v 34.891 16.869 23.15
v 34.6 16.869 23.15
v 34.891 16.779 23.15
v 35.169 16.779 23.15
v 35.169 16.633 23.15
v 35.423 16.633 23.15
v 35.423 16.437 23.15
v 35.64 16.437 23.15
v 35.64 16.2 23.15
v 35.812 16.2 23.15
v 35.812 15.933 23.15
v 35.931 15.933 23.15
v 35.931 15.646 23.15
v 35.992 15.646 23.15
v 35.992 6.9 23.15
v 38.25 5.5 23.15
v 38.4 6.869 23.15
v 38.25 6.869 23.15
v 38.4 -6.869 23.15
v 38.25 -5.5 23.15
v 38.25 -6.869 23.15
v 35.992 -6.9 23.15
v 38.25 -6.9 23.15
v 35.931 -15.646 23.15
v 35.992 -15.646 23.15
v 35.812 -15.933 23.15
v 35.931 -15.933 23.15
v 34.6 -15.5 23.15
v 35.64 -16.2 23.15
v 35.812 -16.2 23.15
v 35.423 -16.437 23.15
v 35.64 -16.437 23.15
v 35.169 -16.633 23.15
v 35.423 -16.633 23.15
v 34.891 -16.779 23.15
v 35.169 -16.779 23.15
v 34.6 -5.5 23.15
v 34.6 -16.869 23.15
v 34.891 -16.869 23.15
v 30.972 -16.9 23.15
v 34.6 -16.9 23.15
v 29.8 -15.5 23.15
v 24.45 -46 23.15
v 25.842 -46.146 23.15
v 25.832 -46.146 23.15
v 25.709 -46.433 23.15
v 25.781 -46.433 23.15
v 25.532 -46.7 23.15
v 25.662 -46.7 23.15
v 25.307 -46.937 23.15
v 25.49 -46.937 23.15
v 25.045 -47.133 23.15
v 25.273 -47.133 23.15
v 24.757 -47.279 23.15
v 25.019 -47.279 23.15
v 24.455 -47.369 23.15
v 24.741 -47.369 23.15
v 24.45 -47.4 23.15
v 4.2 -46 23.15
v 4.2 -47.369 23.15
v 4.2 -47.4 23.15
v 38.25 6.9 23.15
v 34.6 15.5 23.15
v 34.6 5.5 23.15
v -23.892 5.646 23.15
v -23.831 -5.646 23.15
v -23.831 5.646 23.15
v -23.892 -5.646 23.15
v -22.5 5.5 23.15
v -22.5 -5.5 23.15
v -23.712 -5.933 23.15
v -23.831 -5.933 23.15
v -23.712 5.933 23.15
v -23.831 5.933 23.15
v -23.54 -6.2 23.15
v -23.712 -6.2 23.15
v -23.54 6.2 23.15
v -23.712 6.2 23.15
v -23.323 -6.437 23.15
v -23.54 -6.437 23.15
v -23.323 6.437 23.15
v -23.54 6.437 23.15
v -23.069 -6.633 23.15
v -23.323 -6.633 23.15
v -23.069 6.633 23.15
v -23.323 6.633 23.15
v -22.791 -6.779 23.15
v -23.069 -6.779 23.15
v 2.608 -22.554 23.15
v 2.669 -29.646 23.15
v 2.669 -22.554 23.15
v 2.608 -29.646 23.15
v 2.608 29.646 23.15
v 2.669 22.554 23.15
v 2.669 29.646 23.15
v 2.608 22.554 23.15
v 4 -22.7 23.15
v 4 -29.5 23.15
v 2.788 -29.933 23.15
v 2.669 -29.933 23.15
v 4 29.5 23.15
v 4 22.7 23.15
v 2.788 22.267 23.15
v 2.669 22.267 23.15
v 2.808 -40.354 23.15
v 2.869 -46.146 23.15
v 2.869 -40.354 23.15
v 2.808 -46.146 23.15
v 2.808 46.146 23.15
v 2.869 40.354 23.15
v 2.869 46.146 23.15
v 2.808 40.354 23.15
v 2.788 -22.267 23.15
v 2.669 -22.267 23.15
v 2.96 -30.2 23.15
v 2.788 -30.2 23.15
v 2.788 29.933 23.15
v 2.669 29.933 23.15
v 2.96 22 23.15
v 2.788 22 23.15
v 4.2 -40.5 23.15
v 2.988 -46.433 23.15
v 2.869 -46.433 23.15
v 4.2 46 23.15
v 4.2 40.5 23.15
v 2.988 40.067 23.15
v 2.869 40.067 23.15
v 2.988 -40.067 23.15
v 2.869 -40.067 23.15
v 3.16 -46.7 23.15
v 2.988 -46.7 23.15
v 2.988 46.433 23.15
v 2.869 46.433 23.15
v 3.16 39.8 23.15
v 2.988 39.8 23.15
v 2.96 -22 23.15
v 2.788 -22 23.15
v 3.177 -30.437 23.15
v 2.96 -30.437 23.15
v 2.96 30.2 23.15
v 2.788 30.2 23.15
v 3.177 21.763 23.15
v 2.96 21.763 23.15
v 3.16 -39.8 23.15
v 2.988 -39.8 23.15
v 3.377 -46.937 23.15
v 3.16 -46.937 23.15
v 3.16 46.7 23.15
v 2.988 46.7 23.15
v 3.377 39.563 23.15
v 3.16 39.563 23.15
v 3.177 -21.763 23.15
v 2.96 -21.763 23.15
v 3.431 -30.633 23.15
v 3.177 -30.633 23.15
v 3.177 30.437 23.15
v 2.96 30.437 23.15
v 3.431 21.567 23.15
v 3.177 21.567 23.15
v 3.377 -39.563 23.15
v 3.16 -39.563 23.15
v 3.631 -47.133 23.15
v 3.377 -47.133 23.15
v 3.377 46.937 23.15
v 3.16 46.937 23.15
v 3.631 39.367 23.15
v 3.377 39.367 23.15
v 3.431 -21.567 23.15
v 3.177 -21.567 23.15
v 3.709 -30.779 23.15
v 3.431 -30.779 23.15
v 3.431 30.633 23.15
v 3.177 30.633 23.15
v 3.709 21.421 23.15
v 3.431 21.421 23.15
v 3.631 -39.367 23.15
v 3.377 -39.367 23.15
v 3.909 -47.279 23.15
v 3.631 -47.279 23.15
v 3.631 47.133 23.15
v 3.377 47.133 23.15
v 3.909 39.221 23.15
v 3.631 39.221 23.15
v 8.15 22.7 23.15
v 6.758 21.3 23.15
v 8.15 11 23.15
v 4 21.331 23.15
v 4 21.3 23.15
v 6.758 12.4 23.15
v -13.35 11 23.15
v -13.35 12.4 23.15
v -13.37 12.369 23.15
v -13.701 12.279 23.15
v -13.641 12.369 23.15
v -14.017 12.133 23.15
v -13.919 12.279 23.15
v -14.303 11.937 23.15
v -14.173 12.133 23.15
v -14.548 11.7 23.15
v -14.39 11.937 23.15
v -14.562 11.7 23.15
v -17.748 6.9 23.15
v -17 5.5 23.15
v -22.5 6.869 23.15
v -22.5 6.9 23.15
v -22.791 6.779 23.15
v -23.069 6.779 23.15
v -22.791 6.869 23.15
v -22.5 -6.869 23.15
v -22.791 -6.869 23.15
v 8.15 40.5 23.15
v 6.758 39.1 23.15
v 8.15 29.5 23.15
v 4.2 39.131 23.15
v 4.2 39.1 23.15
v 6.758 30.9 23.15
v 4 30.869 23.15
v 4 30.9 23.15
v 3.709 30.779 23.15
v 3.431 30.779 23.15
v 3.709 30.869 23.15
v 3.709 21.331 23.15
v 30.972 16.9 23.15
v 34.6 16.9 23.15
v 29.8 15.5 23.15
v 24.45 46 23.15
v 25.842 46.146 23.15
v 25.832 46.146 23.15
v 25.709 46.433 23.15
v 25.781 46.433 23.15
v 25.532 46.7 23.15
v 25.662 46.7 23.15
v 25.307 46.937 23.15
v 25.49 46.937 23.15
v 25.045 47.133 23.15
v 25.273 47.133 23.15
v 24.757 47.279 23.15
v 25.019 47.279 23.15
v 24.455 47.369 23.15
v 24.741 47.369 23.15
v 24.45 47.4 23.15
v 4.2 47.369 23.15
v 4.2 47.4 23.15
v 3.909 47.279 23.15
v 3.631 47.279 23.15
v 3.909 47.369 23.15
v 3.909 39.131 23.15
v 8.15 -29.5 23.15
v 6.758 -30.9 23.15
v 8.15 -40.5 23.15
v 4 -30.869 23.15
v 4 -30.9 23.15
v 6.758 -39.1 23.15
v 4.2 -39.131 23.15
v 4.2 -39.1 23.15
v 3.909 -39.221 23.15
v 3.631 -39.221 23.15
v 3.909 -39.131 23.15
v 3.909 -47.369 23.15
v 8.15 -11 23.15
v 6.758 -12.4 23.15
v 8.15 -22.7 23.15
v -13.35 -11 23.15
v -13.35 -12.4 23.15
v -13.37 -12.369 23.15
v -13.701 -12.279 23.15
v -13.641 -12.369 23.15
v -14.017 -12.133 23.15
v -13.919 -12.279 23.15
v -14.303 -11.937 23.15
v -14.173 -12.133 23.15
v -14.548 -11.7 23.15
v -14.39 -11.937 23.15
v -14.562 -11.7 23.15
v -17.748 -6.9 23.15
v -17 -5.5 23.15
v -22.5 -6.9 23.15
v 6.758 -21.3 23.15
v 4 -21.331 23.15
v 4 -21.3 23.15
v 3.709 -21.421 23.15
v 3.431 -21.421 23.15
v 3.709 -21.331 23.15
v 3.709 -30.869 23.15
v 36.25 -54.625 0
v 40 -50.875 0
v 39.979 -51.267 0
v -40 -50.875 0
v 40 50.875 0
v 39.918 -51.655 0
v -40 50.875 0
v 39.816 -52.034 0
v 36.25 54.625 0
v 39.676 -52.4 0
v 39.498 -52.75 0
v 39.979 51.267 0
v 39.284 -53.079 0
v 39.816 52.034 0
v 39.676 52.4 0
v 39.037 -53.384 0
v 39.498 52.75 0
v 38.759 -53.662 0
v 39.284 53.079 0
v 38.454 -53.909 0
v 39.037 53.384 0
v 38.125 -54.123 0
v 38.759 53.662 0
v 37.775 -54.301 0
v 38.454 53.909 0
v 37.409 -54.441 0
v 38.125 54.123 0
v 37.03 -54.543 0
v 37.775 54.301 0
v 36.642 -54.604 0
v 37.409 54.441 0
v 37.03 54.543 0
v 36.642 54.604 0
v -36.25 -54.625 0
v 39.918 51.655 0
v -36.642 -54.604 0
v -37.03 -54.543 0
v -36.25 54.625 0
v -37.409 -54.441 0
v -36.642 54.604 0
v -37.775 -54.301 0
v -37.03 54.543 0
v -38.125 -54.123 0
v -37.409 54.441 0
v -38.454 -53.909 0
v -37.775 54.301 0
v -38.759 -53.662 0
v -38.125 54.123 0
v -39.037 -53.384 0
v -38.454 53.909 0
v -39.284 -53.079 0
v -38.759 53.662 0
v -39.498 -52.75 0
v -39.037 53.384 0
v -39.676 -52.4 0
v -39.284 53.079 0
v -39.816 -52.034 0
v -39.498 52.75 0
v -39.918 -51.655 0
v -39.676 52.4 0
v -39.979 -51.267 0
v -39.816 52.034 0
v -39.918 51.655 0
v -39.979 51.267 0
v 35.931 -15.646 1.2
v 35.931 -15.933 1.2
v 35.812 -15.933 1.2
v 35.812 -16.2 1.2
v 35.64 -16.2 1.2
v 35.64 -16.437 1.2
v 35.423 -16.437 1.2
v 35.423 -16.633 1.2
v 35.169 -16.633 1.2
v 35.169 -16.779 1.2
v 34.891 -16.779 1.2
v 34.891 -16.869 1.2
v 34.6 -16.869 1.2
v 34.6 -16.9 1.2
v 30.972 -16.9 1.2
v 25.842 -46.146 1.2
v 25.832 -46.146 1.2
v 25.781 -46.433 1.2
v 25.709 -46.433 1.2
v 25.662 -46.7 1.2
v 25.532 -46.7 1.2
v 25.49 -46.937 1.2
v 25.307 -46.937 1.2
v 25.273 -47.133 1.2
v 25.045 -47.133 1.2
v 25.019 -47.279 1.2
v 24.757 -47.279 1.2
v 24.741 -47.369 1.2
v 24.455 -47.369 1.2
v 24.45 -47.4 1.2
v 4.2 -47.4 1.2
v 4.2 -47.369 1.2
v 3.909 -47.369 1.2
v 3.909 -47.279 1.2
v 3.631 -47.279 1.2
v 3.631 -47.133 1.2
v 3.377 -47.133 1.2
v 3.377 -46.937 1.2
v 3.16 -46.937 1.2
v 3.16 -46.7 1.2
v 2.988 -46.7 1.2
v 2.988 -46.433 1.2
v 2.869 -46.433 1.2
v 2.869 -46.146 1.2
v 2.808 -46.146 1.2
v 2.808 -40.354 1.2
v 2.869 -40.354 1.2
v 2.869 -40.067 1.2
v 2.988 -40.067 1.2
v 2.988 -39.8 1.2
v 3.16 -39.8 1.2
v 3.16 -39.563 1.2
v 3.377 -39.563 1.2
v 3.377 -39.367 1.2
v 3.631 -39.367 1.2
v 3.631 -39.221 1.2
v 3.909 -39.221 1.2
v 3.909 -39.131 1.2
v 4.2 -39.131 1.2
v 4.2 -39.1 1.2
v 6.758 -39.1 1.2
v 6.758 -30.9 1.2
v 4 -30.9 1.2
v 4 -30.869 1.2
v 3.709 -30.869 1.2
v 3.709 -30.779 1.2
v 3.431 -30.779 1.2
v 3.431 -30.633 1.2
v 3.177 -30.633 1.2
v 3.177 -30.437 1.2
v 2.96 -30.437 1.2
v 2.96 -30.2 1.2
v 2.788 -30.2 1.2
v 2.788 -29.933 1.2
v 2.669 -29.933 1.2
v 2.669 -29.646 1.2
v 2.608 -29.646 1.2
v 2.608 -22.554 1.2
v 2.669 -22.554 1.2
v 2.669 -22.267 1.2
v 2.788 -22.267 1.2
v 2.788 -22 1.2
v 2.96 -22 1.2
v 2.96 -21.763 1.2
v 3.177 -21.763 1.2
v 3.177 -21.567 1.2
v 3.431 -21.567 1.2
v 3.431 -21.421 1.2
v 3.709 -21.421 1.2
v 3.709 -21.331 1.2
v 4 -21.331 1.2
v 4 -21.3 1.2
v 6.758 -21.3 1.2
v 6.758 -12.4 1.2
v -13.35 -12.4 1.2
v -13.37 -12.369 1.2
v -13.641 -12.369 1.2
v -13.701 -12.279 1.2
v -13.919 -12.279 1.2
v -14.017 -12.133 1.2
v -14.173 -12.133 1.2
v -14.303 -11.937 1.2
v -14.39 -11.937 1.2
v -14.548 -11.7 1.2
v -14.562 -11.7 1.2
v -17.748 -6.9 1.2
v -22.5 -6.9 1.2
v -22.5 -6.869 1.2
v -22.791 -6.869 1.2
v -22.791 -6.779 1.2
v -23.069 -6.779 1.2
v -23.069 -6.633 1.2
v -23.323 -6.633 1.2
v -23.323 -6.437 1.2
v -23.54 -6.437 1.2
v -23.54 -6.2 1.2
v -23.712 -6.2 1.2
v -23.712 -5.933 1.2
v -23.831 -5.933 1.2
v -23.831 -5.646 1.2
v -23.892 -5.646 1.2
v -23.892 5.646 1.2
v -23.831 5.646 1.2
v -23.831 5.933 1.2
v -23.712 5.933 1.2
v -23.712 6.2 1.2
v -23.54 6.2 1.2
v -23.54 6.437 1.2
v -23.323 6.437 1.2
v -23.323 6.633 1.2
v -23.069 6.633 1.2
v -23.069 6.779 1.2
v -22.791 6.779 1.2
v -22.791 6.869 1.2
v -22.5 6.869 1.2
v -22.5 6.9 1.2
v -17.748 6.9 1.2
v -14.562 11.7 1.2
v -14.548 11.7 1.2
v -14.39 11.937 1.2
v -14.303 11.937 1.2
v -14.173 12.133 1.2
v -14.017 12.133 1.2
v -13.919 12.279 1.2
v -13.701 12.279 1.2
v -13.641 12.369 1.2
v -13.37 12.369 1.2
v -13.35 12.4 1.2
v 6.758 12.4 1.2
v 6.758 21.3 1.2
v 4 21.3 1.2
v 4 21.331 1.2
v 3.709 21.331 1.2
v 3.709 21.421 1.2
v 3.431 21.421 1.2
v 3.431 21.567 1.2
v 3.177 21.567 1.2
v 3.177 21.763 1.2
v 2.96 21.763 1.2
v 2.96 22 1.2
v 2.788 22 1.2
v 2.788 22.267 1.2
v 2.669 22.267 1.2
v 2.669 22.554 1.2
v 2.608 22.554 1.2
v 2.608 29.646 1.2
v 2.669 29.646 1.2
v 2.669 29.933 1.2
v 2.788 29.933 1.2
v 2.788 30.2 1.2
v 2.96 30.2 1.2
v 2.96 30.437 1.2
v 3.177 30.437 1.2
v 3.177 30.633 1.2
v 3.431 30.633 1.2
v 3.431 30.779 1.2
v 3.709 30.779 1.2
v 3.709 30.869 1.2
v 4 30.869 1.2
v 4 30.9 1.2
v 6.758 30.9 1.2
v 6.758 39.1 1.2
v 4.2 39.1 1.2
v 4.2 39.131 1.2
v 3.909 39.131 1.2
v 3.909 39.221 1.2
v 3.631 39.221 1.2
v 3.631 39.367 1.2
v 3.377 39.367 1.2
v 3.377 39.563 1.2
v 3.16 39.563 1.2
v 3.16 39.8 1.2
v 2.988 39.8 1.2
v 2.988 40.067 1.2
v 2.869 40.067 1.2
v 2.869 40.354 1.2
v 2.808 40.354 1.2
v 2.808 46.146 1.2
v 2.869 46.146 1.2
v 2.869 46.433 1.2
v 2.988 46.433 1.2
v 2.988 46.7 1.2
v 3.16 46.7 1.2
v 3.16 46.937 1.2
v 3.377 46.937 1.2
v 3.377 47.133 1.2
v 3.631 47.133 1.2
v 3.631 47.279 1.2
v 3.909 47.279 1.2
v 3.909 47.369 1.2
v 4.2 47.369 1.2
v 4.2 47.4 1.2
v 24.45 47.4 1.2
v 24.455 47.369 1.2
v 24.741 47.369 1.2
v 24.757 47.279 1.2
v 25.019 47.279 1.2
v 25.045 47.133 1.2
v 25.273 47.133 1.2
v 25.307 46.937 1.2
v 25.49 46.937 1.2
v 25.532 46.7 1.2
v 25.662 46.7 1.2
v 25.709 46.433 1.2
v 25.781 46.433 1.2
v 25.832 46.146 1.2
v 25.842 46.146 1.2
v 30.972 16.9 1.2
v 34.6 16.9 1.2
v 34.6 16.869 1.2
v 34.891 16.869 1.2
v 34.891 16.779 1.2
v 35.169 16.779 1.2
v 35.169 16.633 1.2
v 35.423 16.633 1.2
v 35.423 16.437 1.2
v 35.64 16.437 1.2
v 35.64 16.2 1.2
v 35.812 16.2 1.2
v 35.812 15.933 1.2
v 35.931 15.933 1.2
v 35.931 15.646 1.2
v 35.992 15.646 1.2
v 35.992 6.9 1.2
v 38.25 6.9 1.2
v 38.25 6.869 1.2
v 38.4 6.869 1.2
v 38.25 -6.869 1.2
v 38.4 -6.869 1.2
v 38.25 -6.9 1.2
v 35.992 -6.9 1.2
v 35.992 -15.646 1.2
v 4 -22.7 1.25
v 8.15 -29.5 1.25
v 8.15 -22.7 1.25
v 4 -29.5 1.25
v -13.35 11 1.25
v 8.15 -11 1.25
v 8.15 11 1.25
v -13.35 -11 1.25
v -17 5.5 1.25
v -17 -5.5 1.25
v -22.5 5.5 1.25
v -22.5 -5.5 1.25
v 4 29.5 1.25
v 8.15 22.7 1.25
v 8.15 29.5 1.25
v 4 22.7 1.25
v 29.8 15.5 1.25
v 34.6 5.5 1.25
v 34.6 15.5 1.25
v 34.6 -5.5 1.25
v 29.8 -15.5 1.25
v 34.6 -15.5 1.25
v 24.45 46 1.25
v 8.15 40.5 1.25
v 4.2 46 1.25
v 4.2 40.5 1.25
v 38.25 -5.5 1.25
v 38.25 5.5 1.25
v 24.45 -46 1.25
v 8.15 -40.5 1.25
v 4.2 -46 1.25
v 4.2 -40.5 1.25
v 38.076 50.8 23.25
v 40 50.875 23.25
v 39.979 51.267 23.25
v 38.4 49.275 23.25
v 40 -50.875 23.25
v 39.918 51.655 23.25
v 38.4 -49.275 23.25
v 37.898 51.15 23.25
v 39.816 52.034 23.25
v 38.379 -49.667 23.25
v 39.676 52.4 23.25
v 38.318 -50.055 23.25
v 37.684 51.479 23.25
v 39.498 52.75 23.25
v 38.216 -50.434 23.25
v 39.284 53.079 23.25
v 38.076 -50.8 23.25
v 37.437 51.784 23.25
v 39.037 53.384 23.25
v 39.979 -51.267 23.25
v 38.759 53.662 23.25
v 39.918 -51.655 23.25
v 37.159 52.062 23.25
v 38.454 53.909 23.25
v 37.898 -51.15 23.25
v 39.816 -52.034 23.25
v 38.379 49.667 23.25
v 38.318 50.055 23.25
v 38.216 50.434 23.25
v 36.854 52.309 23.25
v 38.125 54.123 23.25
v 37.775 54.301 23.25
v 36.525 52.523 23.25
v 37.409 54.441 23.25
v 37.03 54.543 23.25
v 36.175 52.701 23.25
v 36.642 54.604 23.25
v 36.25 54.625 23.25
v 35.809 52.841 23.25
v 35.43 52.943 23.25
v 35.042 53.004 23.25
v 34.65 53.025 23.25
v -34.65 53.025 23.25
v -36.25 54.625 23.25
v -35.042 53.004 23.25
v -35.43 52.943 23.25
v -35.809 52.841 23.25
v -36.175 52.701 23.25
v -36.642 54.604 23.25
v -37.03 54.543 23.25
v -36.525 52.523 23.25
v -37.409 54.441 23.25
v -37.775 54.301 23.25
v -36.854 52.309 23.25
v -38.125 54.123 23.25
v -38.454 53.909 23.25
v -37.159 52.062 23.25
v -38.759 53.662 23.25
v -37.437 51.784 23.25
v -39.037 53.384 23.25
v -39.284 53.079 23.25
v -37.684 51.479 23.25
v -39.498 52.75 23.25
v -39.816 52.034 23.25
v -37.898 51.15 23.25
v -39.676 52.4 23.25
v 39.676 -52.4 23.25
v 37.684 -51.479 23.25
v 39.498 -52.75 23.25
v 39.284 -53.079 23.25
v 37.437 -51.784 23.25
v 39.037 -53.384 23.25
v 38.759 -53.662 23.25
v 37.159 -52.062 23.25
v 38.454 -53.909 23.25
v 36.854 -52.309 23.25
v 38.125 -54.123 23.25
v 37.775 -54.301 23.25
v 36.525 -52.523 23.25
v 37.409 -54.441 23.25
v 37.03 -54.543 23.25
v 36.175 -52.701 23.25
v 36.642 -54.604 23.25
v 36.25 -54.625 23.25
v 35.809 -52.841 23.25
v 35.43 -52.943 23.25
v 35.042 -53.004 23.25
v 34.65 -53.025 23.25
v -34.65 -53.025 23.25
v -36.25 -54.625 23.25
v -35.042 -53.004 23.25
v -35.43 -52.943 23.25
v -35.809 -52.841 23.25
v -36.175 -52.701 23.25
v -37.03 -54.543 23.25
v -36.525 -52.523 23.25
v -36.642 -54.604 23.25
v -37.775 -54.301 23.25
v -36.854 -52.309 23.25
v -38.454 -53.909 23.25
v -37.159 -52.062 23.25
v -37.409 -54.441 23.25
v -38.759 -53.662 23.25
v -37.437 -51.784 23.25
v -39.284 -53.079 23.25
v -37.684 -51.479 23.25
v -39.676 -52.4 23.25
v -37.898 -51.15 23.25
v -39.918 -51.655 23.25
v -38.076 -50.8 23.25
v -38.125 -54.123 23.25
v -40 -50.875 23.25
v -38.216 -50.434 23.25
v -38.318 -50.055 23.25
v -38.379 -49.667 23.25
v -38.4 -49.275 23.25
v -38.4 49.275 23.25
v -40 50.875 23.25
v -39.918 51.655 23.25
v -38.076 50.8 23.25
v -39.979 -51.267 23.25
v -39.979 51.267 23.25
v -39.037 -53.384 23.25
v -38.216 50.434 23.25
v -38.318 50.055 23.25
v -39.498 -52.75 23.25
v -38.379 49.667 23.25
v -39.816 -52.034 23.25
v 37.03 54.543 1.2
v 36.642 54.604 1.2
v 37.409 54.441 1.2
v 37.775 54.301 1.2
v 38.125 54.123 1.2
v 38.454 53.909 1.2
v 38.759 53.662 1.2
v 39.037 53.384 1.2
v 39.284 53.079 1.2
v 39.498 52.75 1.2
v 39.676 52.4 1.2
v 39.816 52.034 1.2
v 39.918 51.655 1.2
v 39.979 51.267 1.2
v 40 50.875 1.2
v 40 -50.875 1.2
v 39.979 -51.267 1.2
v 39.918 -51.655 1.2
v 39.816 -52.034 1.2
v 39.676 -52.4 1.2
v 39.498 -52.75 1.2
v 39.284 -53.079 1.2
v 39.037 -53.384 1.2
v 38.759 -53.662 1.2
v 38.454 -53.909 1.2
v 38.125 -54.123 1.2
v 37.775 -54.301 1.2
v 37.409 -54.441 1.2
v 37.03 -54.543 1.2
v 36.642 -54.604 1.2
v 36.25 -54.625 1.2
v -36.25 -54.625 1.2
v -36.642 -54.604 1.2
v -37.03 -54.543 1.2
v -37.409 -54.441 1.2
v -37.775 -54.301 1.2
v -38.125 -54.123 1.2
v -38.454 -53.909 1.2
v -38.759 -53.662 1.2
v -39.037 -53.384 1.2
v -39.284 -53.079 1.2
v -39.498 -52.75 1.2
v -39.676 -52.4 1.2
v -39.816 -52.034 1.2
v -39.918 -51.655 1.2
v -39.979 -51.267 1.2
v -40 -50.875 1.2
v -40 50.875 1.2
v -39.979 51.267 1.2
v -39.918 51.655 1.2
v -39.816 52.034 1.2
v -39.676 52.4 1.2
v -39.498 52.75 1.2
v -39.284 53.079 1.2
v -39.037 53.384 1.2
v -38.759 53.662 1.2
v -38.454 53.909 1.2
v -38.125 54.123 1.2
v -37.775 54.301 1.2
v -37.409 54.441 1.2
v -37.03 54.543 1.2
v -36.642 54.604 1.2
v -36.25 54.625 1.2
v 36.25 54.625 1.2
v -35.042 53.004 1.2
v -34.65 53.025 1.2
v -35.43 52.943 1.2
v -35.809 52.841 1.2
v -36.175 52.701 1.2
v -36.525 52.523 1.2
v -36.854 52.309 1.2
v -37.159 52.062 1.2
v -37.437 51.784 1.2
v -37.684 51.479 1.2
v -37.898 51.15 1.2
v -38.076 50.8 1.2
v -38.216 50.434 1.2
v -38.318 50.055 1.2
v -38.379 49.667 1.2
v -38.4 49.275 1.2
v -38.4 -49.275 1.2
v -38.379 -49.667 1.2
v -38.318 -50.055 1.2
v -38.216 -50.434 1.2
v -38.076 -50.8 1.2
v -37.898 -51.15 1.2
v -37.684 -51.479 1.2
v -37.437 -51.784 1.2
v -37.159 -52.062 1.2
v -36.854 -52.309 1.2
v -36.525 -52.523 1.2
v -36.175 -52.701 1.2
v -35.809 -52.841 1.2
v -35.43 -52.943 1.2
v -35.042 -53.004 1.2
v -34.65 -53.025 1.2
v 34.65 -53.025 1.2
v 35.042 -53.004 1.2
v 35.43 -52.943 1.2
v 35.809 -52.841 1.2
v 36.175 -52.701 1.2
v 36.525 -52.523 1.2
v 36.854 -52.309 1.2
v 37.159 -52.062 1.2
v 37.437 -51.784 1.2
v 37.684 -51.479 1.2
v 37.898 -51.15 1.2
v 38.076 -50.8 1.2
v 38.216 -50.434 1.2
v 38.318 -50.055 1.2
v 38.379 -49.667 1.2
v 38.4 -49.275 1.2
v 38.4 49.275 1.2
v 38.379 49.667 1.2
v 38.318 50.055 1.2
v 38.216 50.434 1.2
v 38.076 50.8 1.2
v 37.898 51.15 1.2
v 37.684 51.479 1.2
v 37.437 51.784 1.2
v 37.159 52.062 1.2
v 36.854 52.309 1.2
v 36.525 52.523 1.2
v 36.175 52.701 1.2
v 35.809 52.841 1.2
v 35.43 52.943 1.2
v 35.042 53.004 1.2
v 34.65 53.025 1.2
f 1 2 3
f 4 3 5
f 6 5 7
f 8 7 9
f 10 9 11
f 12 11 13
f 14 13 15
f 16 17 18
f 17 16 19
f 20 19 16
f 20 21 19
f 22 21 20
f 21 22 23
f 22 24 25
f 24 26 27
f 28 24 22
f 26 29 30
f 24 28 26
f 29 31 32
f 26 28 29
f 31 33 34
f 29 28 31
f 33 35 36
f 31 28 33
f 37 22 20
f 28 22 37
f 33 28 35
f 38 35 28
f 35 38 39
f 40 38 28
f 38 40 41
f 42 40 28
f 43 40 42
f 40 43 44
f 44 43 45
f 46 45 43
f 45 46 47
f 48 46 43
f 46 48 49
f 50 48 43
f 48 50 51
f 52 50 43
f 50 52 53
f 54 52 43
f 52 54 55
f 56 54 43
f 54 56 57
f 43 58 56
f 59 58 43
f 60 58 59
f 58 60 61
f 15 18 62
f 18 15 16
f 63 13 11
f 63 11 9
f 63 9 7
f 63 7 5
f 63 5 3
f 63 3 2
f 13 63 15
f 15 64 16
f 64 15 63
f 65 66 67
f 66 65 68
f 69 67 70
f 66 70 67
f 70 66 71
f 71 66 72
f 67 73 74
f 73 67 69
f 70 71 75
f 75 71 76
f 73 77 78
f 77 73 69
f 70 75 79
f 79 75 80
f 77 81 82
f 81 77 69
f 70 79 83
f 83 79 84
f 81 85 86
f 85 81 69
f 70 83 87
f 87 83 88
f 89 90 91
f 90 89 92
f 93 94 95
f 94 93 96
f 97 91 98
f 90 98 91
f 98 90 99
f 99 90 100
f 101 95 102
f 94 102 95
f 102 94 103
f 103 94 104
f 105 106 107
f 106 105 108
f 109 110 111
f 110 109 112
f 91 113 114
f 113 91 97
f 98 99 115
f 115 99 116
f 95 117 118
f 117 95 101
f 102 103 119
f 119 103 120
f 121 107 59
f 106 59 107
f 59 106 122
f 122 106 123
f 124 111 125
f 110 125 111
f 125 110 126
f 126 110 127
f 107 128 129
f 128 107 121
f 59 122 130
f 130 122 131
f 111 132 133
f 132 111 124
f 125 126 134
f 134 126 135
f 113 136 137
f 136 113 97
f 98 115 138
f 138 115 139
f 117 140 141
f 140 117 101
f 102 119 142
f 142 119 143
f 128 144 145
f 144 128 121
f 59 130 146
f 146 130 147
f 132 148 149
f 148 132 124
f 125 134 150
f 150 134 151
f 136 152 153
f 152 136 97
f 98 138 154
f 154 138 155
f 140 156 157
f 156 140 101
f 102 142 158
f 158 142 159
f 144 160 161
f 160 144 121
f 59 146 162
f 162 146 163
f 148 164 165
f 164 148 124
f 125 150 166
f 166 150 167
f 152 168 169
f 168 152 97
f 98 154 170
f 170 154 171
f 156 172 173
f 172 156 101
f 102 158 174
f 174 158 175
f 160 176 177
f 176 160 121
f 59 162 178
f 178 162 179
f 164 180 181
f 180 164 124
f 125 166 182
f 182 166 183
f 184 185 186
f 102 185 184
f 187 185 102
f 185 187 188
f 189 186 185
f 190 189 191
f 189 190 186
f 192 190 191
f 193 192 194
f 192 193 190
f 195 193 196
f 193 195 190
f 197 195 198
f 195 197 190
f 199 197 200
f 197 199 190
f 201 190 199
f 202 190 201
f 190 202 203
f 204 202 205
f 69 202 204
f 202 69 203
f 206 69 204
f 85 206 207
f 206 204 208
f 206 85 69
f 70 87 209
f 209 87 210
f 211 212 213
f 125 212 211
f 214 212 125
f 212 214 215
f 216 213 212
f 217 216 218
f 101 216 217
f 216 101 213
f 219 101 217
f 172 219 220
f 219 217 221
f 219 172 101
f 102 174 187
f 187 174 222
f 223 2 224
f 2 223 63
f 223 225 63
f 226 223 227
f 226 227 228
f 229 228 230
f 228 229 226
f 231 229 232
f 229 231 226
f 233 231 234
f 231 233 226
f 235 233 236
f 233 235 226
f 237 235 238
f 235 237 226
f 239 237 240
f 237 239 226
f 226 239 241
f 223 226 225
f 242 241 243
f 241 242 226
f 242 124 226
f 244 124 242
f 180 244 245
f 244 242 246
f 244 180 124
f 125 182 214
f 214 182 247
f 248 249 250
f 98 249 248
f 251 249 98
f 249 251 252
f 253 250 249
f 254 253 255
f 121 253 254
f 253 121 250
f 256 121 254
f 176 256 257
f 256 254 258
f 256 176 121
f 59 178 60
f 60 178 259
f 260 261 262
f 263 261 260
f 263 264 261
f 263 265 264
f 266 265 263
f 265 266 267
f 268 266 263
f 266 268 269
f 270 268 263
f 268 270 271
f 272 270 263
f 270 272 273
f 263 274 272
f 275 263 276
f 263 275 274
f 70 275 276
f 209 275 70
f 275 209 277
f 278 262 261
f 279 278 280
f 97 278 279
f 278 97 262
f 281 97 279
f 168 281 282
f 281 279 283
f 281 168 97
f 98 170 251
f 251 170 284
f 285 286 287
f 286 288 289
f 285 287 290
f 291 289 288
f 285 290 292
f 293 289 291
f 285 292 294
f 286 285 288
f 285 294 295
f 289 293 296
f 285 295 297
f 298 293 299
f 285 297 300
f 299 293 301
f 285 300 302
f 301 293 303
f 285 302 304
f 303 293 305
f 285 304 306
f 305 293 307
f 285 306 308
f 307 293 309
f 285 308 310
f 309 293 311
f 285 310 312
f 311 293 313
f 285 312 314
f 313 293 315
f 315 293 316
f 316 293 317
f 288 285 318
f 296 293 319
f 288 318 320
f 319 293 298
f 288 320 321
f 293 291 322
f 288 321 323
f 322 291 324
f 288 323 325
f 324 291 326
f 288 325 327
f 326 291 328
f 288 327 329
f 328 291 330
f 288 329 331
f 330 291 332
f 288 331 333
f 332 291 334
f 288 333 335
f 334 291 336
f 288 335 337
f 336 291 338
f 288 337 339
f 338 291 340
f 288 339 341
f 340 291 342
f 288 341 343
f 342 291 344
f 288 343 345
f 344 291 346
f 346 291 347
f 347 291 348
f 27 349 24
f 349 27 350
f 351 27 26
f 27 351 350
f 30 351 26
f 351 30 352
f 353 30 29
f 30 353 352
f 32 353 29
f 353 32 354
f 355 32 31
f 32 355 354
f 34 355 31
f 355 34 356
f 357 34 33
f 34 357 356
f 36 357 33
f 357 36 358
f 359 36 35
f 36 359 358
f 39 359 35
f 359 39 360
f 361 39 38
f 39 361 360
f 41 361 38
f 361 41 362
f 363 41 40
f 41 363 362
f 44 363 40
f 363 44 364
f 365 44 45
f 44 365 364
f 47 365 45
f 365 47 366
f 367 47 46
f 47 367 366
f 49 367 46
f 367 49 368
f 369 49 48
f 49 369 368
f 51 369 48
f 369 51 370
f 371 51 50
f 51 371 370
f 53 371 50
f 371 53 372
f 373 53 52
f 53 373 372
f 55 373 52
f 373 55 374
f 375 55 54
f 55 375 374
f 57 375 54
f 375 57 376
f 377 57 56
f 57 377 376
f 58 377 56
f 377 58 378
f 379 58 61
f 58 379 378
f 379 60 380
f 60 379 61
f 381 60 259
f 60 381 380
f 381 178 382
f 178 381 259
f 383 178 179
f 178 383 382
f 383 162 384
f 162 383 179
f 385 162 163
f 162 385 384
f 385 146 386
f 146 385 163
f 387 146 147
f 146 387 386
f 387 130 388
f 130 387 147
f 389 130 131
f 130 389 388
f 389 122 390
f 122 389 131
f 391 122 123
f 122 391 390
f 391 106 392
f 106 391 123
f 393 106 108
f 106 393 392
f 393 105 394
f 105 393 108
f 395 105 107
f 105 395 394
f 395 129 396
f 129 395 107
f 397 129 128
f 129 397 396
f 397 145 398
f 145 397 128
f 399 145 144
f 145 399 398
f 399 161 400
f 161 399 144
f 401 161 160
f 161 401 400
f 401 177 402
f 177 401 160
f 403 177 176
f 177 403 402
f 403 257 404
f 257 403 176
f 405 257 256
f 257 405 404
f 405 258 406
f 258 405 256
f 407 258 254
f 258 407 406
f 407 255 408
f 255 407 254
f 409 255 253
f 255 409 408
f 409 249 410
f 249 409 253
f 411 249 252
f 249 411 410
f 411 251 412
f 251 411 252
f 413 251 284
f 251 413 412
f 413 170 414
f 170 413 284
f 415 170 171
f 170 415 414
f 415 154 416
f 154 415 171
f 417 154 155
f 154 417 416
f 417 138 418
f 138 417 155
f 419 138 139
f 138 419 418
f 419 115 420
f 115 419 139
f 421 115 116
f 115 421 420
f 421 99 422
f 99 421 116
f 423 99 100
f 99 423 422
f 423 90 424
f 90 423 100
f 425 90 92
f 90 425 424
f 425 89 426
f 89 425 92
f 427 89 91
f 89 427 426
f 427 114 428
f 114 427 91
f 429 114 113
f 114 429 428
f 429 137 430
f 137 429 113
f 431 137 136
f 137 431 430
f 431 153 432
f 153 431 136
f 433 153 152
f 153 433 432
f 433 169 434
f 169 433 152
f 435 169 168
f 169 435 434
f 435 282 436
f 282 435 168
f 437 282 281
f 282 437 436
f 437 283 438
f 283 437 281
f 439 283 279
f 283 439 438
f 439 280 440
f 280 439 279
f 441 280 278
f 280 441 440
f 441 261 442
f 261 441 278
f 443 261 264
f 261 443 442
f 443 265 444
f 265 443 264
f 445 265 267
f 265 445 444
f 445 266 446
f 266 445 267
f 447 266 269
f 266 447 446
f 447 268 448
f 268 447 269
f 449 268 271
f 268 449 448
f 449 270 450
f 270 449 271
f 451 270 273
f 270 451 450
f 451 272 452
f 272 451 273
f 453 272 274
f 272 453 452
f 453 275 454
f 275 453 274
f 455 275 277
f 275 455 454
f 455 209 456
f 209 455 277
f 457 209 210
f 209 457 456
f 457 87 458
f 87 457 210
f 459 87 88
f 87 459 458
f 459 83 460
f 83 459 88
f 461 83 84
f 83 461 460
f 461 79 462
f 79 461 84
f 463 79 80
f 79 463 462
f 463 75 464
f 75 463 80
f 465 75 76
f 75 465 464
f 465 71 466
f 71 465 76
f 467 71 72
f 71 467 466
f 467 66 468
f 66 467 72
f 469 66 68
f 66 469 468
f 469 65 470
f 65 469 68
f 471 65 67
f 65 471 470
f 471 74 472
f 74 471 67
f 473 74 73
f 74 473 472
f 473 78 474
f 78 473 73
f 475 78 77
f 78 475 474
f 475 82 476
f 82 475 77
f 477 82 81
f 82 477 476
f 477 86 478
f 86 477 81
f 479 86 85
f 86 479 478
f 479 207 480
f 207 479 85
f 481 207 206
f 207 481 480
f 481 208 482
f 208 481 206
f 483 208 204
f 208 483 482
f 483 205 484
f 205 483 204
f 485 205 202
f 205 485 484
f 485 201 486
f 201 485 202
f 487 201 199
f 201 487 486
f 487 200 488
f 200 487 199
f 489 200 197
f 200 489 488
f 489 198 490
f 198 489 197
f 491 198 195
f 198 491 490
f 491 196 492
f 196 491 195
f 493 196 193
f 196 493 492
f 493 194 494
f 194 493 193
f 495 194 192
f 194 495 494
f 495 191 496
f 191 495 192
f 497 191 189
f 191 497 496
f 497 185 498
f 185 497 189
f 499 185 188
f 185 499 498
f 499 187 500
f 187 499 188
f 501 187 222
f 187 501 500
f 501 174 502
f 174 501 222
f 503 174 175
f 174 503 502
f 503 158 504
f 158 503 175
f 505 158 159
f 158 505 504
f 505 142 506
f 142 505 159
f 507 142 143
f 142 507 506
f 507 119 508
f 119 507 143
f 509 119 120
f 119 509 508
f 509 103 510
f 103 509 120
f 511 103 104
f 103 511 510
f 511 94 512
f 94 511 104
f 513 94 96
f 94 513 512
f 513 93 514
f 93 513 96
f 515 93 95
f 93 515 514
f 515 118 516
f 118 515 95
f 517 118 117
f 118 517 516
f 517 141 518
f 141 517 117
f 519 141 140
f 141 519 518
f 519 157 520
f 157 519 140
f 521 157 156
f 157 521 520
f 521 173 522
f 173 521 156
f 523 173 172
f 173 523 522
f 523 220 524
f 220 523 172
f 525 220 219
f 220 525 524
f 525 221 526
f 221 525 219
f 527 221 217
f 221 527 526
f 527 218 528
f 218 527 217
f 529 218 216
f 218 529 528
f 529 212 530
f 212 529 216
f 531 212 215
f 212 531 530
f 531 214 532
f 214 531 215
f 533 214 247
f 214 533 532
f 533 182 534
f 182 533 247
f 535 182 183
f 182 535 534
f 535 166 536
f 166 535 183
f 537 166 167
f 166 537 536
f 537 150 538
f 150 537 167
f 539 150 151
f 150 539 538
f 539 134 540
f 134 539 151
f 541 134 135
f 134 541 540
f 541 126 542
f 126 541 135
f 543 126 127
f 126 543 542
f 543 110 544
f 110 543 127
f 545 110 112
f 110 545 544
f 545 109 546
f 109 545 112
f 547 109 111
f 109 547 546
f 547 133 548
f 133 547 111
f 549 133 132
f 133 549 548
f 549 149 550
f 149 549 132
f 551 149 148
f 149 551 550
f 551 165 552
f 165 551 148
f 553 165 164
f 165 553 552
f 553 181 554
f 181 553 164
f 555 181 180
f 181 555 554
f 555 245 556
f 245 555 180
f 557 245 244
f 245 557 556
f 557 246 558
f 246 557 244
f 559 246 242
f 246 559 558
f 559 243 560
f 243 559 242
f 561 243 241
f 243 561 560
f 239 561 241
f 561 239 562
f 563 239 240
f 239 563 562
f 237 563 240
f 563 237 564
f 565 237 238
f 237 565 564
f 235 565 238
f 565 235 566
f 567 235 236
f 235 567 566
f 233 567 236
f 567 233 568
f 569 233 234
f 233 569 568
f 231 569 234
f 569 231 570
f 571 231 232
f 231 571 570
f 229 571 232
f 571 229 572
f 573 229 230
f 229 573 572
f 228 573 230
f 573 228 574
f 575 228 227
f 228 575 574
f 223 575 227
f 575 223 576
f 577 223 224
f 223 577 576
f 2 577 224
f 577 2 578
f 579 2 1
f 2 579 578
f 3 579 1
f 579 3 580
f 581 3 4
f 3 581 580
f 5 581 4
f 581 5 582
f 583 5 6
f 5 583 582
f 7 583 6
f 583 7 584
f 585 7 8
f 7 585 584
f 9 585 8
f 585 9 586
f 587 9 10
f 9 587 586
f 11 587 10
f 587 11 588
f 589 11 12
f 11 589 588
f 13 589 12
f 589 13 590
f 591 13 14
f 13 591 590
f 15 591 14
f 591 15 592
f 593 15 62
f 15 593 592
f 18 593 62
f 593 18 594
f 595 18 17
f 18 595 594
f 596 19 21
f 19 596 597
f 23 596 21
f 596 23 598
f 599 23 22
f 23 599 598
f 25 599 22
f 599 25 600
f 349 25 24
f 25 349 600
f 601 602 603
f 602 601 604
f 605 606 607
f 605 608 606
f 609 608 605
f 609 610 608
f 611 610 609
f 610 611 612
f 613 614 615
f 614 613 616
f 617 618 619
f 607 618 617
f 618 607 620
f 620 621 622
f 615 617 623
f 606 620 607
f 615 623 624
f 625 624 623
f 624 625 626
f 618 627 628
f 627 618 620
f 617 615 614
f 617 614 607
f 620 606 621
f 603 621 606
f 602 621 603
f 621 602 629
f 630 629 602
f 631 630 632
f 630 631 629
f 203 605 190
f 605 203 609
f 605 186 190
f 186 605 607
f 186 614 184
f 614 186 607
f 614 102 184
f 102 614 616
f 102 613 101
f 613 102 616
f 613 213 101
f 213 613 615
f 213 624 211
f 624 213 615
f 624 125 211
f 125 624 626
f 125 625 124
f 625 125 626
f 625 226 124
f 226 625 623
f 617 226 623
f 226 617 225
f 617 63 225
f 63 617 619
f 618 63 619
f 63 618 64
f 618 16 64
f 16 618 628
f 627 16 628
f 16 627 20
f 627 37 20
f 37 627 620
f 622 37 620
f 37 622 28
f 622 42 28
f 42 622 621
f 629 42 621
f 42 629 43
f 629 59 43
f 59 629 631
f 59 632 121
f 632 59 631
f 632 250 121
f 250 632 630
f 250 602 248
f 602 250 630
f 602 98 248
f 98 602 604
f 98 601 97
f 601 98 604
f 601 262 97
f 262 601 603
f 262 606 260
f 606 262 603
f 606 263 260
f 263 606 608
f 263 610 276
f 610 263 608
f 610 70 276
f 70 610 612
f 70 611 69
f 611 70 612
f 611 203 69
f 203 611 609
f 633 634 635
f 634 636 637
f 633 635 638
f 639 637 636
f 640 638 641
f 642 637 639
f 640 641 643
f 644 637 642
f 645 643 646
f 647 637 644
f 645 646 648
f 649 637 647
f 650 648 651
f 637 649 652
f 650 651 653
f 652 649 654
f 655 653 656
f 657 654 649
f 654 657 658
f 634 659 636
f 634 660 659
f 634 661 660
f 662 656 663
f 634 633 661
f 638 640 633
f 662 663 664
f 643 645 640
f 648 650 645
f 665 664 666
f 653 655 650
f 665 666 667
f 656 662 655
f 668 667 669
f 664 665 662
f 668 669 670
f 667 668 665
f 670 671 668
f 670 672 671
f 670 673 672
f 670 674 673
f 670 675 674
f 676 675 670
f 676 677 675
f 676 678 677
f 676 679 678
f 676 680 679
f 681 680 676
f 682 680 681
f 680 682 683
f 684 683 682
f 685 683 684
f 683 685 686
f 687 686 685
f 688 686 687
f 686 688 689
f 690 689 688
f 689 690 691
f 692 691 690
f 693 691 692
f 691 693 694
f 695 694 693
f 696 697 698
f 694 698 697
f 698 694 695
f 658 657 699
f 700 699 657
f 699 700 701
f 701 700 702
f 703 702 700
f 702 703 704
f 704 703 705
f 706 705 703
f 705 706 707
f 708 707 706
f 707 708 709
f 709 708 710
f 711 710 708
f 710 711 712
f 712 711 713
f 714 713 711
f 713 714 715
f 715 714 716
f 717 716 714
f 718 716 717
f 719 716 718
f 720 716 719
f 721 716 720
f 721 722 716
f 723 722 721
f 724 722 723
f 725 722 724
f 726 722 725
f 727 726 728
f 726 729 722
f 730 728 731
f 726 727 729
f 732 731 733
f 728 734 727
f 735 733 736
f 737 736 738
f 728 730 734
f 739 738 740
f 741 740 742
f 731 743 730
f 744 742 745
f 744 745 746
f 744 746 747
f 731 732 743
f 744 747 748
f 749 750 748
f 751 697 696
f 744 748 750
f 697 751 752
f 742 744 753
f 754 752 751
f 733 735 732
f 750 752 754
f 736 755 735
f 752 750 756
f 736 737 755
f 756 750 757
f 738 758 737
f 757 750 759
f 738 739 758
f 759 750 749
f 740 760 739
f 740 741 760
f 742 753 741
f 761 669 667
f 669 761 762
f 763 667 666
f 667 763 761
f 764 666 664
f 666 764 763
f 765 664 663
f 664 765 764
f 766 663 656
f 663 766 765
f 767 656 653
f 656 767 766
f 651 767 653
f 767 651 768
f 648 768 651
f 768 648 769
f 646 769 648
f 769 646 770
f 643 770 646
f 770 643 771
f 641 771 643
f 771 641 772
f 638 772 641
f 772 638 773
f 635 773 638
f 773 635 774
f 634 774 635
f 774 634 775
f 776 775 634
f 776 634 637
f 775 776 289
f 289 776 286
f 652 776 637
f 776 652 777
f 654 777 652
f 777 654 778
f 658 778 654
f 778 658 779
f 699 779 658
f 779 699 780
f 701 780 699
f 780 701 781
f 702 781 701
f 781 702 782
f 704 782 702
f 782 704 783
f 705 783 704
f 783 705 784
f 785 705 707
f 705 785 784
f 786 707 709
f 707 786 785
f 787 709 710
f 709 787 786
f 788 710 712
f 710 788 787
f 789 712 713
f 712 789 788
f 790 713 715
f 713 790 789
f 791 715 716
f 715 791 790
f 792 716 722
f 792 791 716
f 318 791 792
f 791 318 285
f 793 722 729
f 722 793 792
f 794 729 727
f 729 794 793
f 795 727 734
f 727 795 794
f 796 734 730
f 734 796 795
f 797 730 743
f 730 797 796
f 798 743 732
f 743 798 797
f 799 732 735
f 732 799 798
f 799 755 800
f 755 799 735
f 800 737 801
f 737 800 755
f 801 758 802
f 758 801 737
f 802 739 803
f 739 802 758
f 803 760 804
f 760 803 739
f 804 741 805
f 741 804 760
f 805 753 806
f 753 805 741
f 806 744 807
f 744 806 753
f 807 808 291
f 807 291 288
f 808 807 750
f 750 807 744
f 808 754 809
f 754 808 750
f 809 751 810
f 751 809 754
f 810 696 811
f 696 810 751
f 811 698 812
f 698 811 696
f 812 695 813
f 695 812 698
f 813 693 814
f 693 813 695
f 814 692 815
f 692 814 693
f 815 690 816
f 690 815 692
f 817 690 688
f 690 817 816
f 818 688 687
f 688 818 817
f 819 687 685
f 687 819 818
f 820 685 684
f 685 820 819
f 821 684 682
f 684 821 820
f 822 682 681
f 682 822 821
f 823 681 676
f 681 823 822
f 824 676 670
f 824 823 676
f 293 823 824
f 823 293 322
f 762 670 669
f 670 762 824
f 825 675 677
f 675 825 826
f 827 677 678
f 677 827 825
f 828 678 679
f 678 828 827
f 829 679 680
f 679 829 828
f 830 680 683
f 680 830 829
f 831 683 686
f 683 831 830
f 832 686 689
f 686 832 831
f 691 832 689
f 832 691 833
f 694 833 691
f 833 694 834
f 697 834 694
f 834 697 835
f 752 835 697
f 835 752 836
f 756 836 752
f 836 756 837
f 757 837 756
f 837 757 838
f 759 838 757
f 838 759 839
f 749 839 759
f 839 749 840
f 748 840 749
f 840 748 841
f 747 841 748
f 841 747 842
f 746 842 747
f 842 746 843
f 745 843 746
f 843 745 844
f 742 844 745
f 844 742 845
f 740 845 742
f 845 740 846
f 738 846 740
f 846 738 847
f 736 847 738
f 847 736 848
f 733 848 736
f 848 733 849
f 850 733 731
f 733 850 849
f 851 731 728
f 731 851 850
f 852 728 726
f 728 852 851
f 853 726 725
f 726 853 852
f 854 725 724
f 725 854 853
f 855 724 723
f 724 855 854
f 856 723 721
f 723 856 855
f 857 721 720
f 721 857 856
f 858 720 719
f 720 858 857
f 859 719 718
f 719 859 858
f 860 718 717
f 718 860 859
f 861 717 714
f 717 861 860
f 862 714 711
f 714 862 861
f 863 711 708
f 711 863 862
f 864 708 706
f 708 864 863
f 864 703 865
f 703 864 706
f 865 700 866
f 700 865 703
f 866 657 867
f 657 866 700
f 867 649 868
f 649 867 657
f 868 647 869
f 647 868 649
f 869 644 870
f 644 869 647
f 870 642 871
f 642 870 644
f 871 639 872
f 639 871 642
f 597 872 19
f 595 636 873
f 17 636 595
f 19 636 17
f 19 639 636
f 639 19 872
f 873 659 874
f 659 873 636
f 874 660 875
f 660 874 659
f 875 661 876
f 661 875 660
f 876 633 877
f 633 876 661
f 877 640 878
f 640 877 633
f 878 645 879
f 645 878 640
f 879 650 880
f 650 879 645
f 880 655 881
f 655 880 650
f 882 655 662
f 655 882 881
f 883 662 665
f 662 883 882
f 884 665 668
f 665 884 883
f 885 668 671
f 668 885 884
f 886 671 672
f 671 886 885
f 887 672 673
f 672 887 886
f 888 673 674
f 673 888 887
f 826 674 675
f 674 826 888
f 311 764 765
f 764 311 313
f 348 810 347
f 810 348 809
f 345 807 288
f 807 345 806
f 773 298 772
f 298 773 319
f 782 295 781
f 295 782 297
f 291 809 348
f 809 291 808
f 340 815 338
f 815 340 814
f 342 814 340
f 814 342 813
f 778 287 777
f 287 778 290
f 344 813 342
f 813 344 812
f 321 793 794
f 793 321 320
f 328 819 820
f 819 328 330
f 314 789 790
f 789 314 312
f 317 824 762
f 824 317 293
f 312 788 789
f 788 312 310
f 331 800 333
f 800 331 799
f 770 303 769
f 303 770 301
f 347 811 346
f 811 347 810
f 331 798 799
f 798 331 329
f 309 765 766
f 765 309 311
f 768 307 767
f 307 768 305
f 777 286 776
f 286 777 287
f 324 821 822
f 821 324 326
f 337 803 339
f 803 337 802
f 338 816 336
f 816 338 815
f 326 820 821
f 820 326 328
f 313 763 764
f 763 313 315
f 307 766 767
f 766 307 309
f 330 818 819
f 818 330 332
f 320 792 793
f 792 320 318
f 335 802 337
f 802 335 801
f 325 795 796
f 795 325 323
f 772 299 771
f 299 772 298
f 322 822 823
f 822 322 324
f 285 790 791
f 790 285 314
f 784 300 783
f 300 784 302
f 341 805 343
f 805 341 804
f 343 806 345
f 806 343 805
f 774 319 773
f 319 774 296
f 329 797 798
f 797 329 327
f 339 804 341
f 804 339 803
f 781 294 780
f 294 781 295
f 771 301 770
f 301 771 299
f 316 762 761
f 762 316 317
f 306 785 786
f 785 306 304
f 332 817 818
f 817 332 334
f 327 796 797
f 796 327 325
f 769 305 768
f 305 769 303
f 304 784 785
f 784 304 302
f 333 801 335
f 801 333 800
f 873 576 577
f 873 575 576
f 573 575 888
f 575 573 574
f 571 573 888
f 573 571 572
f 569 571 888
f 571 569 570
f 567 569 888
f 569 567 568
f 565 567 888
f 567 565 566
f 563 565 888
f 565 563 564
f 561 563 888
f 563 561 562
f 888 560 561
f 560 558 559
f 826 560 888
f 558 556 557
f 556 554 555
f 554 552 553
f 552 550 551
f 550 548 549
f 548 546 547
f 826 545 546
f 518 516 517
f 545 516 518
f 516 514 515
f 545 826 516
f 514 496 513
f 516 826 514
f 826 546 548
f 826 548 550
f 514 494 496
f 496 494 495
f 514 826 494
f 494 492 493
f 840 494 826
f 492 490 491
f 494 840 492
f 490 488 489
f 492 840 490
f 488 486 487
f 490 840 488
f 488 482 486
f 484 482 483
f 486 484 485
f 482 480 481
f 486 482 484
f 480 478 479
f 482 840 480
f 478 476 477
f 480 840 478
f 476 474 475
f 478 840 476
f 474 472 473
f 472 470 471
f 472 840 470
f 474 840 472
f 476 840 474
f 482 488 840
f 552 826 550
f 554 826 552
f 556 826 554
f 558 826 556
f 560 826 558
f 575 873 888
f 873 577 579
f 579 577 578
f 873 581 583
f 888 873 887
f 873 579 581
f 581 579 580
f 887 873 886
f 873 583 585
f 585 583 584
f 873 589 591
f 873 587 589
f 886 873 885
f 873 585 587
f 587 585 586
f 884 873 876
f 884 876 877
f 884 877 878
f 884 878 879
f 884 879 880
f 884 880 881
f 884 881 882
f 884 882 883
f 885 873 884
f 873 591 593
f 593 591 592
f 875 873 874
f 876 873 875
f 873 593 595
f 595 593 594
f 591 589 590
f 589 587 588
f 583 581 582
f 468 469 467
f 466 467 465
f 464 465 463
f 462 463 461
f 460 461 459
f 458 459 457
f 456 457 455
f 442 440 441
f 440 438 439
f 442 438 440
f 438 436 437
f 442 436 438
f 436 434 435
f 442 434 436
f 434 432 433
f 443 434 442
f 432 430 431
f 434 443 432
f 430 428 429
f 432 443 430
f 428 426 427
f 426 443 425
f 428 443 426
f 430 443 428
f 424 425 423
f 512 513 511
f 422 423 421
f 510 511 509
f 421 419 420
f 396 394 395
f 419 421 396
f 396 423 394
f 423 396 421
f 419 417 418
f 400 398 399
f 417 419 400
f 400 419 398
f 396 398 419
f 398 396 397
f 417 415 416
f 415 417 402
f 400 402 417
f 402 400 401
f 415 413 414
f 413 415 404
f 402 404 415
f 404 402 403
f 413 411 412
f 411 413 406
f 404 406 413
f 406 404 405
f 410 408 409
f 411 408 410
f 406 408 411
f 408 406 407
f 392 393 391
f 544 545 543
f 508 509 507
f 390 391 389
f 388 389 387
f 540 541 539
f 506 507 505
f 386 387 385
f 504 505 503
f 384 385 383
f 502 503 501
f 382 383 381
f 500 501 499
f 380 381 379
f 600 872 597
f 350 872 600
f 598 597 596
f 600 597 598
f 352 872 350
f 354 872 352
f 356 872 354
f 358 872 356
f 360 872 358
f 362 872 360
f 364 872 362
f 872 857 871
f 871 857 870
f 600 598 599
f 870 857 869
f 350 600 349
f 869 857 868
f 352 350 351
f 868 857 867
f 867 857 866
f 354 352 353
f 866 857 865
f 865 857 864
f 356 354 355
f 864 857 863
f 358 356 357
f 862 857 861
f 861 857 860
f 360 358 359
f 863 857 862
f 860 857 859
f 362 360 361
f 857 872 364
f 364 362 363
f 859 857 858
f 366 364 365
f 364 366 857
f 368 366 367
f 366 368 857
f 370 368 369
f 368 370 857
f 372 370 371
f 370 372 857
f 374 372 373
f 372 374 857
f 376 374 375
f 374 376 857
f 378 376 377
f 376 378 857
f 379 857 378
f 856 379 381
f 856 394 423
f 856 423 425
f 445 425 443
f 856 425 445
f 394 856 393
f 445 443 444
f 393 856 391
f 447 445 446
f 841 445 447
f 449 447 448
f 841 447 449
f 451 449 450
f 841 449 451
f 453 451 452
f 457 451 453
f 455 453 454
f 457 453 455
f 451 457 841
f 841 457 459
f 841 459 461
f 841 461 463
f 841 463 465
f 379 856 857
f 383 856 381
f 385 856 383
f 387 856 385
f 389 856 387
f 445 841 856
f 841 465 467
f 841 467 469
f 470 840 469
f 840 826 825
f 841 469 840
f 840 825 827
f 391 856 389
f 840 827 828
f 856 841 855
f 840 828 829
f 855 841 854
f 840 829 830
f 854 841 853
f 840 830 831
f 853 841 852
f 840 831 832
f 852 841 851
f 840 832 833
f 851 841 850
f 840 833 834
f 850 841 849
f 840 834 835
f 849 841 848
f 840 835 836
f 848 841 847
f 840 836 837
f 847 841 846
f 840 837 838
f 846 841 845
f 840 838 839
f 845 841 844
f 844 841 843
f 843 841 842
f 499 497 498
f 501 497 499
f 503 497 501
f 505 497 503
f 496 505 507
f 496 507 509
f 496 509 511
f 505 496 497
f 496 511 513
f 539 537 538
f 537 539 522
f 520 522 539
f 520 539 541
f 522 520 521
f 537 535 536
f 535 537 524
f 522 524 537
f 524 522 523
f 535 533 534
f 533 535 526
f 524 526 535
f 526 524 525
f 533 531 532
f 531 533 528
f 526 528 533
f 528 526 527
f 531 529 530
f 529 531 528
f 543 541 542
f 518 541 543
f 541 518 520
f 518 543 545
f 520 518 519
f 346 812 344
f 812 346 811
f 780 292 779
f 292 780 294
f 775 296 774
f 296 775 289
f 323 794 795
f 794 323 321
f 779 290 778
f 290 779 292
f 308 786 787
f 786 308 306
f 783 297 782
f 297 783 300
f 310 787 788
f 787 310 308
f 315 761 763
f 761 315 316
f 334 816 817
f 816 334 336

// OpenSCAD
/* k-wing-bin.scad
 *
 * Copyright (C) Robert B. Ross, 2016
 *
 * This software is released under the GNU General Public License
 * Version 3.
 *
 */

include <./bintools.scad>

binHeight=46.5/2;
blankHeight=22;

kWingBin();
// kWingAndXBin();
// kWingOutline();
// kWingBlank();

module kWingBin() {
   harborFreightLargeHalfHt(locations=[[[2.5,0,0],[0,0,90]]],inset=0.25,
                            bottomThick=0.9) kWingBlank();
}
module kWingAndXBin() {
   harborFreightLargeHalfHt(locations=[[[0,0,0],[0,0,0]]],inset=0.25,
                            bottomThick=0.9)
   union() {
      translate([2.5,6.25,0]) rotate([0,0,90]) kWingBlank();
      translate([-14.5,-30,0]) rotate([0,0,180]) import("../orig/x-wing-blank.stl");
   }
}

module kWingOutline() {
   translate([0,0,binHeight]) rotate([180,0,0]) {
      blankCutout(height=binHeight, outlineScale=1.2) kWingBlank();
   }
}

module kWingBlank() {
   linear_extrude(height=blankHeight) for(i=[0:1]) mirror([i,0,0])
      polygon(points=[[-0.1,-35.75], [5.5,-35.75], [5.5,-32.1], [15.5,-32.1],
                      [15.5,-27.3], [46,-21.95], [46,-1.7], [40.5,-1.7],
                      [40.5,-5.65], [29.5,-5.65], [29.5,-1.5], [22.7,-1.5],
                      [22.7,-5.65], [11.0,-5.65], [11.0,15.85],
                      [5.5,19.5], [5.5,25], [-0.1,25]]);
}

/*
 * Local variables:
 *  mode: C
 *  c-indent-level: 3
 *  c-basic-offset: 3
 * End:
 *
 * vim: ts=8 sts=4 sw=4 expandtab
 */
